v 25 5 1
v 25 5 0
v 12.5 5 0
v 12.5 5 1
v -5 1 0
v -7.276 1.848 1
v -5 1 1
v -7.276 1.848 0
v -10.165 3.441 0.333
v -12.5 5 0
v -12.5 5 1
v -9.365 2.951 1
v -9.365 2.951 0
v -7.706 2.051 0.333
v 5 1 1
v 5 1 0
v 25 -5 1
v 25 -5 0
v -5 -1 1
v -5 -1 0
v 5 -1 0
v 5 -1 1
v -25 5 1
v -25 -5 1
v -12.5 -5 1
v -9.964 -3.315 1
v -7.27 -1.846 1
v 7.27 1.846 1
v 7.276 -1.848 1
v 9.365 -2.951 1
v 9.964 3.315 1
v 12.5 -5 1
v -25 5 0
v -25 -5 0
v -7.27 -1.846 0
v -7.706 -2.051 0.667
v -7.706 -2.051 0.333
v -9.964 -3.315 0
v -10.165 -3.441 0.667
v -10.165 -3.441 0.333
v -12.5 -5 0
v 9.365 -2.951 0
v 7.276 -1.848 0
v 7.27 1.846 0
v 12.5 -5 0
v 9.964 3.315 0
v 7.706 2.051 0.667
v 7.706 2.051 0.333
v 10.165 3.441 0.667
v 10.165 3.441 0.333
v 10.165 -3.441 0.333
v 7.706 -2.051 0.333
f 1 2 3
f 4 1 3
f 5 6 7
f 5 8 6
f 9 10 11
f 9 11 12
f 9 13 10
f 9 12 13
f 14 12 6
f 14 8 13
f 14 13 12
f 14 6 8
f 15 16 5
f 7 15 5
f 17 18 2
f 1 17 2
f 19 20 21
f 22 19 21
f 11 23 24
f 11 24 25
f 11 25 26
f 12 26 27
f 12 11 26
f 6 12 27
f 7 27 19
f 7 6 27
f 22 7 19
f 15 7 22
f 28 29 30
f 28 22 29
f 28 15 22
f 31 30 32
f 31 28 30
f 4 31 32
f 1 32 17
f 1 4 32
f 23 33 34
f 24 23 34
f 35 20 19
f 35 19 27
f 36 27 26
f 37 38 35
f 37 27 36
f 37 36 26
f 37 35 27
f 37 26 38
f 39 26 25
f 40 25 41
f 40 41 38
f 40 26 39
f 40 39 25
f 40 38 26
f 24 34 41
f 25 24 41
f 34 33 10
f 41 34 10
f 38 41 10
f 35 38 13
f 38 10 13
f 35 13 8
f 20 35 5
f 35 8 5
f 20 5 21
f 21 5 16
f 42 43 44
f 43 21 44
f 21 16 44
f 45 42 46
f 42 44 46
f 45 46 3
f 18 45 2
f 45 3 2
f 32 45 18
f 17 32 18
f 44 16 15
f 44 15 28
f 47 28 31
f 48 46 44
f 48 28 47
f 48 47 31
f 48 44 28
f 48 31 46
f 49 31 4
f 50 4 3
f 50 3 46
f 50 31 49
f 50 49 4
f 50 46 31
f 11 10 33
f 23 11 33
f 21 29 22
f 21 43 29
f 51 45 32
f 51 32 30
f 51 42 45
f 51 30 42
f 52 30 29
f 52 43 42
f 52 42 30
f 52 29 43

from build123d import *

# Parameters (mm, degrees)
F1_DEPTH = 1


with BuildPart() as f1:
    # F0 (on Top) → F1 (new body)
    with BuildSketch(Plane.XY):
        with BuildLine():
            Line((-12.5, 5), (-20, 5))
            Line((-20, 5), (-25, 5))
            Line((-25, 5), (-25, -5))
            Line((-25, -5), (-20, -5))
            Line((-20, -5), (-12.5, -5))
            add(Edge.make_bspline(
                [(-5, -1), (-7.8716344223, -1.8257793632), (-10.1858172112, -3.4128896816), (-12.5, -5)],
                knots=[0.6758143524, 0.6758143524, 0.6758143524, 0.6758143524, 1, 1, 1, 1], degree=3))
            add(Edge.make_bspline(
                [(5, -1), (1.8852751504, -0.1043165234), (-1.8852751504, -0.1043165234), (-5, -1)],
                knots=[0.3241856476, 0.3241856476, 0.3241856476, 0.3241856476, 0.6758143524, 0.6758143524, 0.6758143524, 0.6758143524], degree=3))
            add(Edge.make_bspline(
                [(12.5, -5), (10.1858172112, -3.4128896816), (7.8716344223, -1.8257793632), (5, -1)],
                knots=[0, 0, 0, 0, 0.3241856476, 0.3241856476, 0.3241856476, 0.3241856476], degree=3))
            Line((12.5, -5), (20, -5))
            Line((20, -5), (25, -5))
            Line((25, -5), (25, 5))
            Line((25, 5), (20, 5))
            Line((20, 5), (12.5, 5))
            add(Edge.make_bspline(
                [(5, 1), (7.8716344223, 1.8257793632), (10.1858172112, 3.4128896816), (12.5, 5)],
                knots=[0.6758143524, 0.6758143524, 0.6758143524, 0.6758143524, 1, 1, 1, 1], degree=3))
            add(Edge.make_bspline(
                [(-5, 1), (-1.8852751504, 0.1043165234), (1.8852751504, 0.1043165234), (5, 1)],
                knots=[0.3241856476, 0.3241856476, 0.3241856476, 0.3241856476, 0.6758143524, 0.6758143524, 0.6758143524, 0.6758143524], degree=3))
            add(Edge.make_bspline(
                [(-12.5, 5), (-10.1858172112, 3.4128896816), (-7.8716344223, 1.8257793632), (-5, 1)],
                knots=[0, 0, 0, 0, 0.3241856476, 0.3241856476, 0.3241856476, 0.3241856476], degree=3))
        make_face()
        with BuildLine():
            Line((5, 1), (-5, 1))
            add(Edge.make_bspline(
                [(-5, 1), (-1.8852751504, 0.1043165234), (1.8852751504, 0.1043165234), (5, 1)],
                knots=[0.3241856476, 0.3241856476, 0.3241856476, 0.3241856476, 0.6758143524, 0.6758143524, 0.6758143524, 0.6758143524], degree=3))
        make_face()
        with BuildLine():
            add(Edge.make_bspline(
                [(5, -1), (1.8852751504, -0.1043165234), (-1.8852751504, -0.1043165234), (-5, -1)],
                knots=[0.3241856476, 0.3241856476, 0.3241856476, 0.3241856476, 0.6758143524, 0.6758143524, 0.6758143524, 0.6758143524], degree=3))
            Line((-5, -1), (5, -1))
        make_face()
    extrude(amount=F1_DEPTH)


solid = f1.part
